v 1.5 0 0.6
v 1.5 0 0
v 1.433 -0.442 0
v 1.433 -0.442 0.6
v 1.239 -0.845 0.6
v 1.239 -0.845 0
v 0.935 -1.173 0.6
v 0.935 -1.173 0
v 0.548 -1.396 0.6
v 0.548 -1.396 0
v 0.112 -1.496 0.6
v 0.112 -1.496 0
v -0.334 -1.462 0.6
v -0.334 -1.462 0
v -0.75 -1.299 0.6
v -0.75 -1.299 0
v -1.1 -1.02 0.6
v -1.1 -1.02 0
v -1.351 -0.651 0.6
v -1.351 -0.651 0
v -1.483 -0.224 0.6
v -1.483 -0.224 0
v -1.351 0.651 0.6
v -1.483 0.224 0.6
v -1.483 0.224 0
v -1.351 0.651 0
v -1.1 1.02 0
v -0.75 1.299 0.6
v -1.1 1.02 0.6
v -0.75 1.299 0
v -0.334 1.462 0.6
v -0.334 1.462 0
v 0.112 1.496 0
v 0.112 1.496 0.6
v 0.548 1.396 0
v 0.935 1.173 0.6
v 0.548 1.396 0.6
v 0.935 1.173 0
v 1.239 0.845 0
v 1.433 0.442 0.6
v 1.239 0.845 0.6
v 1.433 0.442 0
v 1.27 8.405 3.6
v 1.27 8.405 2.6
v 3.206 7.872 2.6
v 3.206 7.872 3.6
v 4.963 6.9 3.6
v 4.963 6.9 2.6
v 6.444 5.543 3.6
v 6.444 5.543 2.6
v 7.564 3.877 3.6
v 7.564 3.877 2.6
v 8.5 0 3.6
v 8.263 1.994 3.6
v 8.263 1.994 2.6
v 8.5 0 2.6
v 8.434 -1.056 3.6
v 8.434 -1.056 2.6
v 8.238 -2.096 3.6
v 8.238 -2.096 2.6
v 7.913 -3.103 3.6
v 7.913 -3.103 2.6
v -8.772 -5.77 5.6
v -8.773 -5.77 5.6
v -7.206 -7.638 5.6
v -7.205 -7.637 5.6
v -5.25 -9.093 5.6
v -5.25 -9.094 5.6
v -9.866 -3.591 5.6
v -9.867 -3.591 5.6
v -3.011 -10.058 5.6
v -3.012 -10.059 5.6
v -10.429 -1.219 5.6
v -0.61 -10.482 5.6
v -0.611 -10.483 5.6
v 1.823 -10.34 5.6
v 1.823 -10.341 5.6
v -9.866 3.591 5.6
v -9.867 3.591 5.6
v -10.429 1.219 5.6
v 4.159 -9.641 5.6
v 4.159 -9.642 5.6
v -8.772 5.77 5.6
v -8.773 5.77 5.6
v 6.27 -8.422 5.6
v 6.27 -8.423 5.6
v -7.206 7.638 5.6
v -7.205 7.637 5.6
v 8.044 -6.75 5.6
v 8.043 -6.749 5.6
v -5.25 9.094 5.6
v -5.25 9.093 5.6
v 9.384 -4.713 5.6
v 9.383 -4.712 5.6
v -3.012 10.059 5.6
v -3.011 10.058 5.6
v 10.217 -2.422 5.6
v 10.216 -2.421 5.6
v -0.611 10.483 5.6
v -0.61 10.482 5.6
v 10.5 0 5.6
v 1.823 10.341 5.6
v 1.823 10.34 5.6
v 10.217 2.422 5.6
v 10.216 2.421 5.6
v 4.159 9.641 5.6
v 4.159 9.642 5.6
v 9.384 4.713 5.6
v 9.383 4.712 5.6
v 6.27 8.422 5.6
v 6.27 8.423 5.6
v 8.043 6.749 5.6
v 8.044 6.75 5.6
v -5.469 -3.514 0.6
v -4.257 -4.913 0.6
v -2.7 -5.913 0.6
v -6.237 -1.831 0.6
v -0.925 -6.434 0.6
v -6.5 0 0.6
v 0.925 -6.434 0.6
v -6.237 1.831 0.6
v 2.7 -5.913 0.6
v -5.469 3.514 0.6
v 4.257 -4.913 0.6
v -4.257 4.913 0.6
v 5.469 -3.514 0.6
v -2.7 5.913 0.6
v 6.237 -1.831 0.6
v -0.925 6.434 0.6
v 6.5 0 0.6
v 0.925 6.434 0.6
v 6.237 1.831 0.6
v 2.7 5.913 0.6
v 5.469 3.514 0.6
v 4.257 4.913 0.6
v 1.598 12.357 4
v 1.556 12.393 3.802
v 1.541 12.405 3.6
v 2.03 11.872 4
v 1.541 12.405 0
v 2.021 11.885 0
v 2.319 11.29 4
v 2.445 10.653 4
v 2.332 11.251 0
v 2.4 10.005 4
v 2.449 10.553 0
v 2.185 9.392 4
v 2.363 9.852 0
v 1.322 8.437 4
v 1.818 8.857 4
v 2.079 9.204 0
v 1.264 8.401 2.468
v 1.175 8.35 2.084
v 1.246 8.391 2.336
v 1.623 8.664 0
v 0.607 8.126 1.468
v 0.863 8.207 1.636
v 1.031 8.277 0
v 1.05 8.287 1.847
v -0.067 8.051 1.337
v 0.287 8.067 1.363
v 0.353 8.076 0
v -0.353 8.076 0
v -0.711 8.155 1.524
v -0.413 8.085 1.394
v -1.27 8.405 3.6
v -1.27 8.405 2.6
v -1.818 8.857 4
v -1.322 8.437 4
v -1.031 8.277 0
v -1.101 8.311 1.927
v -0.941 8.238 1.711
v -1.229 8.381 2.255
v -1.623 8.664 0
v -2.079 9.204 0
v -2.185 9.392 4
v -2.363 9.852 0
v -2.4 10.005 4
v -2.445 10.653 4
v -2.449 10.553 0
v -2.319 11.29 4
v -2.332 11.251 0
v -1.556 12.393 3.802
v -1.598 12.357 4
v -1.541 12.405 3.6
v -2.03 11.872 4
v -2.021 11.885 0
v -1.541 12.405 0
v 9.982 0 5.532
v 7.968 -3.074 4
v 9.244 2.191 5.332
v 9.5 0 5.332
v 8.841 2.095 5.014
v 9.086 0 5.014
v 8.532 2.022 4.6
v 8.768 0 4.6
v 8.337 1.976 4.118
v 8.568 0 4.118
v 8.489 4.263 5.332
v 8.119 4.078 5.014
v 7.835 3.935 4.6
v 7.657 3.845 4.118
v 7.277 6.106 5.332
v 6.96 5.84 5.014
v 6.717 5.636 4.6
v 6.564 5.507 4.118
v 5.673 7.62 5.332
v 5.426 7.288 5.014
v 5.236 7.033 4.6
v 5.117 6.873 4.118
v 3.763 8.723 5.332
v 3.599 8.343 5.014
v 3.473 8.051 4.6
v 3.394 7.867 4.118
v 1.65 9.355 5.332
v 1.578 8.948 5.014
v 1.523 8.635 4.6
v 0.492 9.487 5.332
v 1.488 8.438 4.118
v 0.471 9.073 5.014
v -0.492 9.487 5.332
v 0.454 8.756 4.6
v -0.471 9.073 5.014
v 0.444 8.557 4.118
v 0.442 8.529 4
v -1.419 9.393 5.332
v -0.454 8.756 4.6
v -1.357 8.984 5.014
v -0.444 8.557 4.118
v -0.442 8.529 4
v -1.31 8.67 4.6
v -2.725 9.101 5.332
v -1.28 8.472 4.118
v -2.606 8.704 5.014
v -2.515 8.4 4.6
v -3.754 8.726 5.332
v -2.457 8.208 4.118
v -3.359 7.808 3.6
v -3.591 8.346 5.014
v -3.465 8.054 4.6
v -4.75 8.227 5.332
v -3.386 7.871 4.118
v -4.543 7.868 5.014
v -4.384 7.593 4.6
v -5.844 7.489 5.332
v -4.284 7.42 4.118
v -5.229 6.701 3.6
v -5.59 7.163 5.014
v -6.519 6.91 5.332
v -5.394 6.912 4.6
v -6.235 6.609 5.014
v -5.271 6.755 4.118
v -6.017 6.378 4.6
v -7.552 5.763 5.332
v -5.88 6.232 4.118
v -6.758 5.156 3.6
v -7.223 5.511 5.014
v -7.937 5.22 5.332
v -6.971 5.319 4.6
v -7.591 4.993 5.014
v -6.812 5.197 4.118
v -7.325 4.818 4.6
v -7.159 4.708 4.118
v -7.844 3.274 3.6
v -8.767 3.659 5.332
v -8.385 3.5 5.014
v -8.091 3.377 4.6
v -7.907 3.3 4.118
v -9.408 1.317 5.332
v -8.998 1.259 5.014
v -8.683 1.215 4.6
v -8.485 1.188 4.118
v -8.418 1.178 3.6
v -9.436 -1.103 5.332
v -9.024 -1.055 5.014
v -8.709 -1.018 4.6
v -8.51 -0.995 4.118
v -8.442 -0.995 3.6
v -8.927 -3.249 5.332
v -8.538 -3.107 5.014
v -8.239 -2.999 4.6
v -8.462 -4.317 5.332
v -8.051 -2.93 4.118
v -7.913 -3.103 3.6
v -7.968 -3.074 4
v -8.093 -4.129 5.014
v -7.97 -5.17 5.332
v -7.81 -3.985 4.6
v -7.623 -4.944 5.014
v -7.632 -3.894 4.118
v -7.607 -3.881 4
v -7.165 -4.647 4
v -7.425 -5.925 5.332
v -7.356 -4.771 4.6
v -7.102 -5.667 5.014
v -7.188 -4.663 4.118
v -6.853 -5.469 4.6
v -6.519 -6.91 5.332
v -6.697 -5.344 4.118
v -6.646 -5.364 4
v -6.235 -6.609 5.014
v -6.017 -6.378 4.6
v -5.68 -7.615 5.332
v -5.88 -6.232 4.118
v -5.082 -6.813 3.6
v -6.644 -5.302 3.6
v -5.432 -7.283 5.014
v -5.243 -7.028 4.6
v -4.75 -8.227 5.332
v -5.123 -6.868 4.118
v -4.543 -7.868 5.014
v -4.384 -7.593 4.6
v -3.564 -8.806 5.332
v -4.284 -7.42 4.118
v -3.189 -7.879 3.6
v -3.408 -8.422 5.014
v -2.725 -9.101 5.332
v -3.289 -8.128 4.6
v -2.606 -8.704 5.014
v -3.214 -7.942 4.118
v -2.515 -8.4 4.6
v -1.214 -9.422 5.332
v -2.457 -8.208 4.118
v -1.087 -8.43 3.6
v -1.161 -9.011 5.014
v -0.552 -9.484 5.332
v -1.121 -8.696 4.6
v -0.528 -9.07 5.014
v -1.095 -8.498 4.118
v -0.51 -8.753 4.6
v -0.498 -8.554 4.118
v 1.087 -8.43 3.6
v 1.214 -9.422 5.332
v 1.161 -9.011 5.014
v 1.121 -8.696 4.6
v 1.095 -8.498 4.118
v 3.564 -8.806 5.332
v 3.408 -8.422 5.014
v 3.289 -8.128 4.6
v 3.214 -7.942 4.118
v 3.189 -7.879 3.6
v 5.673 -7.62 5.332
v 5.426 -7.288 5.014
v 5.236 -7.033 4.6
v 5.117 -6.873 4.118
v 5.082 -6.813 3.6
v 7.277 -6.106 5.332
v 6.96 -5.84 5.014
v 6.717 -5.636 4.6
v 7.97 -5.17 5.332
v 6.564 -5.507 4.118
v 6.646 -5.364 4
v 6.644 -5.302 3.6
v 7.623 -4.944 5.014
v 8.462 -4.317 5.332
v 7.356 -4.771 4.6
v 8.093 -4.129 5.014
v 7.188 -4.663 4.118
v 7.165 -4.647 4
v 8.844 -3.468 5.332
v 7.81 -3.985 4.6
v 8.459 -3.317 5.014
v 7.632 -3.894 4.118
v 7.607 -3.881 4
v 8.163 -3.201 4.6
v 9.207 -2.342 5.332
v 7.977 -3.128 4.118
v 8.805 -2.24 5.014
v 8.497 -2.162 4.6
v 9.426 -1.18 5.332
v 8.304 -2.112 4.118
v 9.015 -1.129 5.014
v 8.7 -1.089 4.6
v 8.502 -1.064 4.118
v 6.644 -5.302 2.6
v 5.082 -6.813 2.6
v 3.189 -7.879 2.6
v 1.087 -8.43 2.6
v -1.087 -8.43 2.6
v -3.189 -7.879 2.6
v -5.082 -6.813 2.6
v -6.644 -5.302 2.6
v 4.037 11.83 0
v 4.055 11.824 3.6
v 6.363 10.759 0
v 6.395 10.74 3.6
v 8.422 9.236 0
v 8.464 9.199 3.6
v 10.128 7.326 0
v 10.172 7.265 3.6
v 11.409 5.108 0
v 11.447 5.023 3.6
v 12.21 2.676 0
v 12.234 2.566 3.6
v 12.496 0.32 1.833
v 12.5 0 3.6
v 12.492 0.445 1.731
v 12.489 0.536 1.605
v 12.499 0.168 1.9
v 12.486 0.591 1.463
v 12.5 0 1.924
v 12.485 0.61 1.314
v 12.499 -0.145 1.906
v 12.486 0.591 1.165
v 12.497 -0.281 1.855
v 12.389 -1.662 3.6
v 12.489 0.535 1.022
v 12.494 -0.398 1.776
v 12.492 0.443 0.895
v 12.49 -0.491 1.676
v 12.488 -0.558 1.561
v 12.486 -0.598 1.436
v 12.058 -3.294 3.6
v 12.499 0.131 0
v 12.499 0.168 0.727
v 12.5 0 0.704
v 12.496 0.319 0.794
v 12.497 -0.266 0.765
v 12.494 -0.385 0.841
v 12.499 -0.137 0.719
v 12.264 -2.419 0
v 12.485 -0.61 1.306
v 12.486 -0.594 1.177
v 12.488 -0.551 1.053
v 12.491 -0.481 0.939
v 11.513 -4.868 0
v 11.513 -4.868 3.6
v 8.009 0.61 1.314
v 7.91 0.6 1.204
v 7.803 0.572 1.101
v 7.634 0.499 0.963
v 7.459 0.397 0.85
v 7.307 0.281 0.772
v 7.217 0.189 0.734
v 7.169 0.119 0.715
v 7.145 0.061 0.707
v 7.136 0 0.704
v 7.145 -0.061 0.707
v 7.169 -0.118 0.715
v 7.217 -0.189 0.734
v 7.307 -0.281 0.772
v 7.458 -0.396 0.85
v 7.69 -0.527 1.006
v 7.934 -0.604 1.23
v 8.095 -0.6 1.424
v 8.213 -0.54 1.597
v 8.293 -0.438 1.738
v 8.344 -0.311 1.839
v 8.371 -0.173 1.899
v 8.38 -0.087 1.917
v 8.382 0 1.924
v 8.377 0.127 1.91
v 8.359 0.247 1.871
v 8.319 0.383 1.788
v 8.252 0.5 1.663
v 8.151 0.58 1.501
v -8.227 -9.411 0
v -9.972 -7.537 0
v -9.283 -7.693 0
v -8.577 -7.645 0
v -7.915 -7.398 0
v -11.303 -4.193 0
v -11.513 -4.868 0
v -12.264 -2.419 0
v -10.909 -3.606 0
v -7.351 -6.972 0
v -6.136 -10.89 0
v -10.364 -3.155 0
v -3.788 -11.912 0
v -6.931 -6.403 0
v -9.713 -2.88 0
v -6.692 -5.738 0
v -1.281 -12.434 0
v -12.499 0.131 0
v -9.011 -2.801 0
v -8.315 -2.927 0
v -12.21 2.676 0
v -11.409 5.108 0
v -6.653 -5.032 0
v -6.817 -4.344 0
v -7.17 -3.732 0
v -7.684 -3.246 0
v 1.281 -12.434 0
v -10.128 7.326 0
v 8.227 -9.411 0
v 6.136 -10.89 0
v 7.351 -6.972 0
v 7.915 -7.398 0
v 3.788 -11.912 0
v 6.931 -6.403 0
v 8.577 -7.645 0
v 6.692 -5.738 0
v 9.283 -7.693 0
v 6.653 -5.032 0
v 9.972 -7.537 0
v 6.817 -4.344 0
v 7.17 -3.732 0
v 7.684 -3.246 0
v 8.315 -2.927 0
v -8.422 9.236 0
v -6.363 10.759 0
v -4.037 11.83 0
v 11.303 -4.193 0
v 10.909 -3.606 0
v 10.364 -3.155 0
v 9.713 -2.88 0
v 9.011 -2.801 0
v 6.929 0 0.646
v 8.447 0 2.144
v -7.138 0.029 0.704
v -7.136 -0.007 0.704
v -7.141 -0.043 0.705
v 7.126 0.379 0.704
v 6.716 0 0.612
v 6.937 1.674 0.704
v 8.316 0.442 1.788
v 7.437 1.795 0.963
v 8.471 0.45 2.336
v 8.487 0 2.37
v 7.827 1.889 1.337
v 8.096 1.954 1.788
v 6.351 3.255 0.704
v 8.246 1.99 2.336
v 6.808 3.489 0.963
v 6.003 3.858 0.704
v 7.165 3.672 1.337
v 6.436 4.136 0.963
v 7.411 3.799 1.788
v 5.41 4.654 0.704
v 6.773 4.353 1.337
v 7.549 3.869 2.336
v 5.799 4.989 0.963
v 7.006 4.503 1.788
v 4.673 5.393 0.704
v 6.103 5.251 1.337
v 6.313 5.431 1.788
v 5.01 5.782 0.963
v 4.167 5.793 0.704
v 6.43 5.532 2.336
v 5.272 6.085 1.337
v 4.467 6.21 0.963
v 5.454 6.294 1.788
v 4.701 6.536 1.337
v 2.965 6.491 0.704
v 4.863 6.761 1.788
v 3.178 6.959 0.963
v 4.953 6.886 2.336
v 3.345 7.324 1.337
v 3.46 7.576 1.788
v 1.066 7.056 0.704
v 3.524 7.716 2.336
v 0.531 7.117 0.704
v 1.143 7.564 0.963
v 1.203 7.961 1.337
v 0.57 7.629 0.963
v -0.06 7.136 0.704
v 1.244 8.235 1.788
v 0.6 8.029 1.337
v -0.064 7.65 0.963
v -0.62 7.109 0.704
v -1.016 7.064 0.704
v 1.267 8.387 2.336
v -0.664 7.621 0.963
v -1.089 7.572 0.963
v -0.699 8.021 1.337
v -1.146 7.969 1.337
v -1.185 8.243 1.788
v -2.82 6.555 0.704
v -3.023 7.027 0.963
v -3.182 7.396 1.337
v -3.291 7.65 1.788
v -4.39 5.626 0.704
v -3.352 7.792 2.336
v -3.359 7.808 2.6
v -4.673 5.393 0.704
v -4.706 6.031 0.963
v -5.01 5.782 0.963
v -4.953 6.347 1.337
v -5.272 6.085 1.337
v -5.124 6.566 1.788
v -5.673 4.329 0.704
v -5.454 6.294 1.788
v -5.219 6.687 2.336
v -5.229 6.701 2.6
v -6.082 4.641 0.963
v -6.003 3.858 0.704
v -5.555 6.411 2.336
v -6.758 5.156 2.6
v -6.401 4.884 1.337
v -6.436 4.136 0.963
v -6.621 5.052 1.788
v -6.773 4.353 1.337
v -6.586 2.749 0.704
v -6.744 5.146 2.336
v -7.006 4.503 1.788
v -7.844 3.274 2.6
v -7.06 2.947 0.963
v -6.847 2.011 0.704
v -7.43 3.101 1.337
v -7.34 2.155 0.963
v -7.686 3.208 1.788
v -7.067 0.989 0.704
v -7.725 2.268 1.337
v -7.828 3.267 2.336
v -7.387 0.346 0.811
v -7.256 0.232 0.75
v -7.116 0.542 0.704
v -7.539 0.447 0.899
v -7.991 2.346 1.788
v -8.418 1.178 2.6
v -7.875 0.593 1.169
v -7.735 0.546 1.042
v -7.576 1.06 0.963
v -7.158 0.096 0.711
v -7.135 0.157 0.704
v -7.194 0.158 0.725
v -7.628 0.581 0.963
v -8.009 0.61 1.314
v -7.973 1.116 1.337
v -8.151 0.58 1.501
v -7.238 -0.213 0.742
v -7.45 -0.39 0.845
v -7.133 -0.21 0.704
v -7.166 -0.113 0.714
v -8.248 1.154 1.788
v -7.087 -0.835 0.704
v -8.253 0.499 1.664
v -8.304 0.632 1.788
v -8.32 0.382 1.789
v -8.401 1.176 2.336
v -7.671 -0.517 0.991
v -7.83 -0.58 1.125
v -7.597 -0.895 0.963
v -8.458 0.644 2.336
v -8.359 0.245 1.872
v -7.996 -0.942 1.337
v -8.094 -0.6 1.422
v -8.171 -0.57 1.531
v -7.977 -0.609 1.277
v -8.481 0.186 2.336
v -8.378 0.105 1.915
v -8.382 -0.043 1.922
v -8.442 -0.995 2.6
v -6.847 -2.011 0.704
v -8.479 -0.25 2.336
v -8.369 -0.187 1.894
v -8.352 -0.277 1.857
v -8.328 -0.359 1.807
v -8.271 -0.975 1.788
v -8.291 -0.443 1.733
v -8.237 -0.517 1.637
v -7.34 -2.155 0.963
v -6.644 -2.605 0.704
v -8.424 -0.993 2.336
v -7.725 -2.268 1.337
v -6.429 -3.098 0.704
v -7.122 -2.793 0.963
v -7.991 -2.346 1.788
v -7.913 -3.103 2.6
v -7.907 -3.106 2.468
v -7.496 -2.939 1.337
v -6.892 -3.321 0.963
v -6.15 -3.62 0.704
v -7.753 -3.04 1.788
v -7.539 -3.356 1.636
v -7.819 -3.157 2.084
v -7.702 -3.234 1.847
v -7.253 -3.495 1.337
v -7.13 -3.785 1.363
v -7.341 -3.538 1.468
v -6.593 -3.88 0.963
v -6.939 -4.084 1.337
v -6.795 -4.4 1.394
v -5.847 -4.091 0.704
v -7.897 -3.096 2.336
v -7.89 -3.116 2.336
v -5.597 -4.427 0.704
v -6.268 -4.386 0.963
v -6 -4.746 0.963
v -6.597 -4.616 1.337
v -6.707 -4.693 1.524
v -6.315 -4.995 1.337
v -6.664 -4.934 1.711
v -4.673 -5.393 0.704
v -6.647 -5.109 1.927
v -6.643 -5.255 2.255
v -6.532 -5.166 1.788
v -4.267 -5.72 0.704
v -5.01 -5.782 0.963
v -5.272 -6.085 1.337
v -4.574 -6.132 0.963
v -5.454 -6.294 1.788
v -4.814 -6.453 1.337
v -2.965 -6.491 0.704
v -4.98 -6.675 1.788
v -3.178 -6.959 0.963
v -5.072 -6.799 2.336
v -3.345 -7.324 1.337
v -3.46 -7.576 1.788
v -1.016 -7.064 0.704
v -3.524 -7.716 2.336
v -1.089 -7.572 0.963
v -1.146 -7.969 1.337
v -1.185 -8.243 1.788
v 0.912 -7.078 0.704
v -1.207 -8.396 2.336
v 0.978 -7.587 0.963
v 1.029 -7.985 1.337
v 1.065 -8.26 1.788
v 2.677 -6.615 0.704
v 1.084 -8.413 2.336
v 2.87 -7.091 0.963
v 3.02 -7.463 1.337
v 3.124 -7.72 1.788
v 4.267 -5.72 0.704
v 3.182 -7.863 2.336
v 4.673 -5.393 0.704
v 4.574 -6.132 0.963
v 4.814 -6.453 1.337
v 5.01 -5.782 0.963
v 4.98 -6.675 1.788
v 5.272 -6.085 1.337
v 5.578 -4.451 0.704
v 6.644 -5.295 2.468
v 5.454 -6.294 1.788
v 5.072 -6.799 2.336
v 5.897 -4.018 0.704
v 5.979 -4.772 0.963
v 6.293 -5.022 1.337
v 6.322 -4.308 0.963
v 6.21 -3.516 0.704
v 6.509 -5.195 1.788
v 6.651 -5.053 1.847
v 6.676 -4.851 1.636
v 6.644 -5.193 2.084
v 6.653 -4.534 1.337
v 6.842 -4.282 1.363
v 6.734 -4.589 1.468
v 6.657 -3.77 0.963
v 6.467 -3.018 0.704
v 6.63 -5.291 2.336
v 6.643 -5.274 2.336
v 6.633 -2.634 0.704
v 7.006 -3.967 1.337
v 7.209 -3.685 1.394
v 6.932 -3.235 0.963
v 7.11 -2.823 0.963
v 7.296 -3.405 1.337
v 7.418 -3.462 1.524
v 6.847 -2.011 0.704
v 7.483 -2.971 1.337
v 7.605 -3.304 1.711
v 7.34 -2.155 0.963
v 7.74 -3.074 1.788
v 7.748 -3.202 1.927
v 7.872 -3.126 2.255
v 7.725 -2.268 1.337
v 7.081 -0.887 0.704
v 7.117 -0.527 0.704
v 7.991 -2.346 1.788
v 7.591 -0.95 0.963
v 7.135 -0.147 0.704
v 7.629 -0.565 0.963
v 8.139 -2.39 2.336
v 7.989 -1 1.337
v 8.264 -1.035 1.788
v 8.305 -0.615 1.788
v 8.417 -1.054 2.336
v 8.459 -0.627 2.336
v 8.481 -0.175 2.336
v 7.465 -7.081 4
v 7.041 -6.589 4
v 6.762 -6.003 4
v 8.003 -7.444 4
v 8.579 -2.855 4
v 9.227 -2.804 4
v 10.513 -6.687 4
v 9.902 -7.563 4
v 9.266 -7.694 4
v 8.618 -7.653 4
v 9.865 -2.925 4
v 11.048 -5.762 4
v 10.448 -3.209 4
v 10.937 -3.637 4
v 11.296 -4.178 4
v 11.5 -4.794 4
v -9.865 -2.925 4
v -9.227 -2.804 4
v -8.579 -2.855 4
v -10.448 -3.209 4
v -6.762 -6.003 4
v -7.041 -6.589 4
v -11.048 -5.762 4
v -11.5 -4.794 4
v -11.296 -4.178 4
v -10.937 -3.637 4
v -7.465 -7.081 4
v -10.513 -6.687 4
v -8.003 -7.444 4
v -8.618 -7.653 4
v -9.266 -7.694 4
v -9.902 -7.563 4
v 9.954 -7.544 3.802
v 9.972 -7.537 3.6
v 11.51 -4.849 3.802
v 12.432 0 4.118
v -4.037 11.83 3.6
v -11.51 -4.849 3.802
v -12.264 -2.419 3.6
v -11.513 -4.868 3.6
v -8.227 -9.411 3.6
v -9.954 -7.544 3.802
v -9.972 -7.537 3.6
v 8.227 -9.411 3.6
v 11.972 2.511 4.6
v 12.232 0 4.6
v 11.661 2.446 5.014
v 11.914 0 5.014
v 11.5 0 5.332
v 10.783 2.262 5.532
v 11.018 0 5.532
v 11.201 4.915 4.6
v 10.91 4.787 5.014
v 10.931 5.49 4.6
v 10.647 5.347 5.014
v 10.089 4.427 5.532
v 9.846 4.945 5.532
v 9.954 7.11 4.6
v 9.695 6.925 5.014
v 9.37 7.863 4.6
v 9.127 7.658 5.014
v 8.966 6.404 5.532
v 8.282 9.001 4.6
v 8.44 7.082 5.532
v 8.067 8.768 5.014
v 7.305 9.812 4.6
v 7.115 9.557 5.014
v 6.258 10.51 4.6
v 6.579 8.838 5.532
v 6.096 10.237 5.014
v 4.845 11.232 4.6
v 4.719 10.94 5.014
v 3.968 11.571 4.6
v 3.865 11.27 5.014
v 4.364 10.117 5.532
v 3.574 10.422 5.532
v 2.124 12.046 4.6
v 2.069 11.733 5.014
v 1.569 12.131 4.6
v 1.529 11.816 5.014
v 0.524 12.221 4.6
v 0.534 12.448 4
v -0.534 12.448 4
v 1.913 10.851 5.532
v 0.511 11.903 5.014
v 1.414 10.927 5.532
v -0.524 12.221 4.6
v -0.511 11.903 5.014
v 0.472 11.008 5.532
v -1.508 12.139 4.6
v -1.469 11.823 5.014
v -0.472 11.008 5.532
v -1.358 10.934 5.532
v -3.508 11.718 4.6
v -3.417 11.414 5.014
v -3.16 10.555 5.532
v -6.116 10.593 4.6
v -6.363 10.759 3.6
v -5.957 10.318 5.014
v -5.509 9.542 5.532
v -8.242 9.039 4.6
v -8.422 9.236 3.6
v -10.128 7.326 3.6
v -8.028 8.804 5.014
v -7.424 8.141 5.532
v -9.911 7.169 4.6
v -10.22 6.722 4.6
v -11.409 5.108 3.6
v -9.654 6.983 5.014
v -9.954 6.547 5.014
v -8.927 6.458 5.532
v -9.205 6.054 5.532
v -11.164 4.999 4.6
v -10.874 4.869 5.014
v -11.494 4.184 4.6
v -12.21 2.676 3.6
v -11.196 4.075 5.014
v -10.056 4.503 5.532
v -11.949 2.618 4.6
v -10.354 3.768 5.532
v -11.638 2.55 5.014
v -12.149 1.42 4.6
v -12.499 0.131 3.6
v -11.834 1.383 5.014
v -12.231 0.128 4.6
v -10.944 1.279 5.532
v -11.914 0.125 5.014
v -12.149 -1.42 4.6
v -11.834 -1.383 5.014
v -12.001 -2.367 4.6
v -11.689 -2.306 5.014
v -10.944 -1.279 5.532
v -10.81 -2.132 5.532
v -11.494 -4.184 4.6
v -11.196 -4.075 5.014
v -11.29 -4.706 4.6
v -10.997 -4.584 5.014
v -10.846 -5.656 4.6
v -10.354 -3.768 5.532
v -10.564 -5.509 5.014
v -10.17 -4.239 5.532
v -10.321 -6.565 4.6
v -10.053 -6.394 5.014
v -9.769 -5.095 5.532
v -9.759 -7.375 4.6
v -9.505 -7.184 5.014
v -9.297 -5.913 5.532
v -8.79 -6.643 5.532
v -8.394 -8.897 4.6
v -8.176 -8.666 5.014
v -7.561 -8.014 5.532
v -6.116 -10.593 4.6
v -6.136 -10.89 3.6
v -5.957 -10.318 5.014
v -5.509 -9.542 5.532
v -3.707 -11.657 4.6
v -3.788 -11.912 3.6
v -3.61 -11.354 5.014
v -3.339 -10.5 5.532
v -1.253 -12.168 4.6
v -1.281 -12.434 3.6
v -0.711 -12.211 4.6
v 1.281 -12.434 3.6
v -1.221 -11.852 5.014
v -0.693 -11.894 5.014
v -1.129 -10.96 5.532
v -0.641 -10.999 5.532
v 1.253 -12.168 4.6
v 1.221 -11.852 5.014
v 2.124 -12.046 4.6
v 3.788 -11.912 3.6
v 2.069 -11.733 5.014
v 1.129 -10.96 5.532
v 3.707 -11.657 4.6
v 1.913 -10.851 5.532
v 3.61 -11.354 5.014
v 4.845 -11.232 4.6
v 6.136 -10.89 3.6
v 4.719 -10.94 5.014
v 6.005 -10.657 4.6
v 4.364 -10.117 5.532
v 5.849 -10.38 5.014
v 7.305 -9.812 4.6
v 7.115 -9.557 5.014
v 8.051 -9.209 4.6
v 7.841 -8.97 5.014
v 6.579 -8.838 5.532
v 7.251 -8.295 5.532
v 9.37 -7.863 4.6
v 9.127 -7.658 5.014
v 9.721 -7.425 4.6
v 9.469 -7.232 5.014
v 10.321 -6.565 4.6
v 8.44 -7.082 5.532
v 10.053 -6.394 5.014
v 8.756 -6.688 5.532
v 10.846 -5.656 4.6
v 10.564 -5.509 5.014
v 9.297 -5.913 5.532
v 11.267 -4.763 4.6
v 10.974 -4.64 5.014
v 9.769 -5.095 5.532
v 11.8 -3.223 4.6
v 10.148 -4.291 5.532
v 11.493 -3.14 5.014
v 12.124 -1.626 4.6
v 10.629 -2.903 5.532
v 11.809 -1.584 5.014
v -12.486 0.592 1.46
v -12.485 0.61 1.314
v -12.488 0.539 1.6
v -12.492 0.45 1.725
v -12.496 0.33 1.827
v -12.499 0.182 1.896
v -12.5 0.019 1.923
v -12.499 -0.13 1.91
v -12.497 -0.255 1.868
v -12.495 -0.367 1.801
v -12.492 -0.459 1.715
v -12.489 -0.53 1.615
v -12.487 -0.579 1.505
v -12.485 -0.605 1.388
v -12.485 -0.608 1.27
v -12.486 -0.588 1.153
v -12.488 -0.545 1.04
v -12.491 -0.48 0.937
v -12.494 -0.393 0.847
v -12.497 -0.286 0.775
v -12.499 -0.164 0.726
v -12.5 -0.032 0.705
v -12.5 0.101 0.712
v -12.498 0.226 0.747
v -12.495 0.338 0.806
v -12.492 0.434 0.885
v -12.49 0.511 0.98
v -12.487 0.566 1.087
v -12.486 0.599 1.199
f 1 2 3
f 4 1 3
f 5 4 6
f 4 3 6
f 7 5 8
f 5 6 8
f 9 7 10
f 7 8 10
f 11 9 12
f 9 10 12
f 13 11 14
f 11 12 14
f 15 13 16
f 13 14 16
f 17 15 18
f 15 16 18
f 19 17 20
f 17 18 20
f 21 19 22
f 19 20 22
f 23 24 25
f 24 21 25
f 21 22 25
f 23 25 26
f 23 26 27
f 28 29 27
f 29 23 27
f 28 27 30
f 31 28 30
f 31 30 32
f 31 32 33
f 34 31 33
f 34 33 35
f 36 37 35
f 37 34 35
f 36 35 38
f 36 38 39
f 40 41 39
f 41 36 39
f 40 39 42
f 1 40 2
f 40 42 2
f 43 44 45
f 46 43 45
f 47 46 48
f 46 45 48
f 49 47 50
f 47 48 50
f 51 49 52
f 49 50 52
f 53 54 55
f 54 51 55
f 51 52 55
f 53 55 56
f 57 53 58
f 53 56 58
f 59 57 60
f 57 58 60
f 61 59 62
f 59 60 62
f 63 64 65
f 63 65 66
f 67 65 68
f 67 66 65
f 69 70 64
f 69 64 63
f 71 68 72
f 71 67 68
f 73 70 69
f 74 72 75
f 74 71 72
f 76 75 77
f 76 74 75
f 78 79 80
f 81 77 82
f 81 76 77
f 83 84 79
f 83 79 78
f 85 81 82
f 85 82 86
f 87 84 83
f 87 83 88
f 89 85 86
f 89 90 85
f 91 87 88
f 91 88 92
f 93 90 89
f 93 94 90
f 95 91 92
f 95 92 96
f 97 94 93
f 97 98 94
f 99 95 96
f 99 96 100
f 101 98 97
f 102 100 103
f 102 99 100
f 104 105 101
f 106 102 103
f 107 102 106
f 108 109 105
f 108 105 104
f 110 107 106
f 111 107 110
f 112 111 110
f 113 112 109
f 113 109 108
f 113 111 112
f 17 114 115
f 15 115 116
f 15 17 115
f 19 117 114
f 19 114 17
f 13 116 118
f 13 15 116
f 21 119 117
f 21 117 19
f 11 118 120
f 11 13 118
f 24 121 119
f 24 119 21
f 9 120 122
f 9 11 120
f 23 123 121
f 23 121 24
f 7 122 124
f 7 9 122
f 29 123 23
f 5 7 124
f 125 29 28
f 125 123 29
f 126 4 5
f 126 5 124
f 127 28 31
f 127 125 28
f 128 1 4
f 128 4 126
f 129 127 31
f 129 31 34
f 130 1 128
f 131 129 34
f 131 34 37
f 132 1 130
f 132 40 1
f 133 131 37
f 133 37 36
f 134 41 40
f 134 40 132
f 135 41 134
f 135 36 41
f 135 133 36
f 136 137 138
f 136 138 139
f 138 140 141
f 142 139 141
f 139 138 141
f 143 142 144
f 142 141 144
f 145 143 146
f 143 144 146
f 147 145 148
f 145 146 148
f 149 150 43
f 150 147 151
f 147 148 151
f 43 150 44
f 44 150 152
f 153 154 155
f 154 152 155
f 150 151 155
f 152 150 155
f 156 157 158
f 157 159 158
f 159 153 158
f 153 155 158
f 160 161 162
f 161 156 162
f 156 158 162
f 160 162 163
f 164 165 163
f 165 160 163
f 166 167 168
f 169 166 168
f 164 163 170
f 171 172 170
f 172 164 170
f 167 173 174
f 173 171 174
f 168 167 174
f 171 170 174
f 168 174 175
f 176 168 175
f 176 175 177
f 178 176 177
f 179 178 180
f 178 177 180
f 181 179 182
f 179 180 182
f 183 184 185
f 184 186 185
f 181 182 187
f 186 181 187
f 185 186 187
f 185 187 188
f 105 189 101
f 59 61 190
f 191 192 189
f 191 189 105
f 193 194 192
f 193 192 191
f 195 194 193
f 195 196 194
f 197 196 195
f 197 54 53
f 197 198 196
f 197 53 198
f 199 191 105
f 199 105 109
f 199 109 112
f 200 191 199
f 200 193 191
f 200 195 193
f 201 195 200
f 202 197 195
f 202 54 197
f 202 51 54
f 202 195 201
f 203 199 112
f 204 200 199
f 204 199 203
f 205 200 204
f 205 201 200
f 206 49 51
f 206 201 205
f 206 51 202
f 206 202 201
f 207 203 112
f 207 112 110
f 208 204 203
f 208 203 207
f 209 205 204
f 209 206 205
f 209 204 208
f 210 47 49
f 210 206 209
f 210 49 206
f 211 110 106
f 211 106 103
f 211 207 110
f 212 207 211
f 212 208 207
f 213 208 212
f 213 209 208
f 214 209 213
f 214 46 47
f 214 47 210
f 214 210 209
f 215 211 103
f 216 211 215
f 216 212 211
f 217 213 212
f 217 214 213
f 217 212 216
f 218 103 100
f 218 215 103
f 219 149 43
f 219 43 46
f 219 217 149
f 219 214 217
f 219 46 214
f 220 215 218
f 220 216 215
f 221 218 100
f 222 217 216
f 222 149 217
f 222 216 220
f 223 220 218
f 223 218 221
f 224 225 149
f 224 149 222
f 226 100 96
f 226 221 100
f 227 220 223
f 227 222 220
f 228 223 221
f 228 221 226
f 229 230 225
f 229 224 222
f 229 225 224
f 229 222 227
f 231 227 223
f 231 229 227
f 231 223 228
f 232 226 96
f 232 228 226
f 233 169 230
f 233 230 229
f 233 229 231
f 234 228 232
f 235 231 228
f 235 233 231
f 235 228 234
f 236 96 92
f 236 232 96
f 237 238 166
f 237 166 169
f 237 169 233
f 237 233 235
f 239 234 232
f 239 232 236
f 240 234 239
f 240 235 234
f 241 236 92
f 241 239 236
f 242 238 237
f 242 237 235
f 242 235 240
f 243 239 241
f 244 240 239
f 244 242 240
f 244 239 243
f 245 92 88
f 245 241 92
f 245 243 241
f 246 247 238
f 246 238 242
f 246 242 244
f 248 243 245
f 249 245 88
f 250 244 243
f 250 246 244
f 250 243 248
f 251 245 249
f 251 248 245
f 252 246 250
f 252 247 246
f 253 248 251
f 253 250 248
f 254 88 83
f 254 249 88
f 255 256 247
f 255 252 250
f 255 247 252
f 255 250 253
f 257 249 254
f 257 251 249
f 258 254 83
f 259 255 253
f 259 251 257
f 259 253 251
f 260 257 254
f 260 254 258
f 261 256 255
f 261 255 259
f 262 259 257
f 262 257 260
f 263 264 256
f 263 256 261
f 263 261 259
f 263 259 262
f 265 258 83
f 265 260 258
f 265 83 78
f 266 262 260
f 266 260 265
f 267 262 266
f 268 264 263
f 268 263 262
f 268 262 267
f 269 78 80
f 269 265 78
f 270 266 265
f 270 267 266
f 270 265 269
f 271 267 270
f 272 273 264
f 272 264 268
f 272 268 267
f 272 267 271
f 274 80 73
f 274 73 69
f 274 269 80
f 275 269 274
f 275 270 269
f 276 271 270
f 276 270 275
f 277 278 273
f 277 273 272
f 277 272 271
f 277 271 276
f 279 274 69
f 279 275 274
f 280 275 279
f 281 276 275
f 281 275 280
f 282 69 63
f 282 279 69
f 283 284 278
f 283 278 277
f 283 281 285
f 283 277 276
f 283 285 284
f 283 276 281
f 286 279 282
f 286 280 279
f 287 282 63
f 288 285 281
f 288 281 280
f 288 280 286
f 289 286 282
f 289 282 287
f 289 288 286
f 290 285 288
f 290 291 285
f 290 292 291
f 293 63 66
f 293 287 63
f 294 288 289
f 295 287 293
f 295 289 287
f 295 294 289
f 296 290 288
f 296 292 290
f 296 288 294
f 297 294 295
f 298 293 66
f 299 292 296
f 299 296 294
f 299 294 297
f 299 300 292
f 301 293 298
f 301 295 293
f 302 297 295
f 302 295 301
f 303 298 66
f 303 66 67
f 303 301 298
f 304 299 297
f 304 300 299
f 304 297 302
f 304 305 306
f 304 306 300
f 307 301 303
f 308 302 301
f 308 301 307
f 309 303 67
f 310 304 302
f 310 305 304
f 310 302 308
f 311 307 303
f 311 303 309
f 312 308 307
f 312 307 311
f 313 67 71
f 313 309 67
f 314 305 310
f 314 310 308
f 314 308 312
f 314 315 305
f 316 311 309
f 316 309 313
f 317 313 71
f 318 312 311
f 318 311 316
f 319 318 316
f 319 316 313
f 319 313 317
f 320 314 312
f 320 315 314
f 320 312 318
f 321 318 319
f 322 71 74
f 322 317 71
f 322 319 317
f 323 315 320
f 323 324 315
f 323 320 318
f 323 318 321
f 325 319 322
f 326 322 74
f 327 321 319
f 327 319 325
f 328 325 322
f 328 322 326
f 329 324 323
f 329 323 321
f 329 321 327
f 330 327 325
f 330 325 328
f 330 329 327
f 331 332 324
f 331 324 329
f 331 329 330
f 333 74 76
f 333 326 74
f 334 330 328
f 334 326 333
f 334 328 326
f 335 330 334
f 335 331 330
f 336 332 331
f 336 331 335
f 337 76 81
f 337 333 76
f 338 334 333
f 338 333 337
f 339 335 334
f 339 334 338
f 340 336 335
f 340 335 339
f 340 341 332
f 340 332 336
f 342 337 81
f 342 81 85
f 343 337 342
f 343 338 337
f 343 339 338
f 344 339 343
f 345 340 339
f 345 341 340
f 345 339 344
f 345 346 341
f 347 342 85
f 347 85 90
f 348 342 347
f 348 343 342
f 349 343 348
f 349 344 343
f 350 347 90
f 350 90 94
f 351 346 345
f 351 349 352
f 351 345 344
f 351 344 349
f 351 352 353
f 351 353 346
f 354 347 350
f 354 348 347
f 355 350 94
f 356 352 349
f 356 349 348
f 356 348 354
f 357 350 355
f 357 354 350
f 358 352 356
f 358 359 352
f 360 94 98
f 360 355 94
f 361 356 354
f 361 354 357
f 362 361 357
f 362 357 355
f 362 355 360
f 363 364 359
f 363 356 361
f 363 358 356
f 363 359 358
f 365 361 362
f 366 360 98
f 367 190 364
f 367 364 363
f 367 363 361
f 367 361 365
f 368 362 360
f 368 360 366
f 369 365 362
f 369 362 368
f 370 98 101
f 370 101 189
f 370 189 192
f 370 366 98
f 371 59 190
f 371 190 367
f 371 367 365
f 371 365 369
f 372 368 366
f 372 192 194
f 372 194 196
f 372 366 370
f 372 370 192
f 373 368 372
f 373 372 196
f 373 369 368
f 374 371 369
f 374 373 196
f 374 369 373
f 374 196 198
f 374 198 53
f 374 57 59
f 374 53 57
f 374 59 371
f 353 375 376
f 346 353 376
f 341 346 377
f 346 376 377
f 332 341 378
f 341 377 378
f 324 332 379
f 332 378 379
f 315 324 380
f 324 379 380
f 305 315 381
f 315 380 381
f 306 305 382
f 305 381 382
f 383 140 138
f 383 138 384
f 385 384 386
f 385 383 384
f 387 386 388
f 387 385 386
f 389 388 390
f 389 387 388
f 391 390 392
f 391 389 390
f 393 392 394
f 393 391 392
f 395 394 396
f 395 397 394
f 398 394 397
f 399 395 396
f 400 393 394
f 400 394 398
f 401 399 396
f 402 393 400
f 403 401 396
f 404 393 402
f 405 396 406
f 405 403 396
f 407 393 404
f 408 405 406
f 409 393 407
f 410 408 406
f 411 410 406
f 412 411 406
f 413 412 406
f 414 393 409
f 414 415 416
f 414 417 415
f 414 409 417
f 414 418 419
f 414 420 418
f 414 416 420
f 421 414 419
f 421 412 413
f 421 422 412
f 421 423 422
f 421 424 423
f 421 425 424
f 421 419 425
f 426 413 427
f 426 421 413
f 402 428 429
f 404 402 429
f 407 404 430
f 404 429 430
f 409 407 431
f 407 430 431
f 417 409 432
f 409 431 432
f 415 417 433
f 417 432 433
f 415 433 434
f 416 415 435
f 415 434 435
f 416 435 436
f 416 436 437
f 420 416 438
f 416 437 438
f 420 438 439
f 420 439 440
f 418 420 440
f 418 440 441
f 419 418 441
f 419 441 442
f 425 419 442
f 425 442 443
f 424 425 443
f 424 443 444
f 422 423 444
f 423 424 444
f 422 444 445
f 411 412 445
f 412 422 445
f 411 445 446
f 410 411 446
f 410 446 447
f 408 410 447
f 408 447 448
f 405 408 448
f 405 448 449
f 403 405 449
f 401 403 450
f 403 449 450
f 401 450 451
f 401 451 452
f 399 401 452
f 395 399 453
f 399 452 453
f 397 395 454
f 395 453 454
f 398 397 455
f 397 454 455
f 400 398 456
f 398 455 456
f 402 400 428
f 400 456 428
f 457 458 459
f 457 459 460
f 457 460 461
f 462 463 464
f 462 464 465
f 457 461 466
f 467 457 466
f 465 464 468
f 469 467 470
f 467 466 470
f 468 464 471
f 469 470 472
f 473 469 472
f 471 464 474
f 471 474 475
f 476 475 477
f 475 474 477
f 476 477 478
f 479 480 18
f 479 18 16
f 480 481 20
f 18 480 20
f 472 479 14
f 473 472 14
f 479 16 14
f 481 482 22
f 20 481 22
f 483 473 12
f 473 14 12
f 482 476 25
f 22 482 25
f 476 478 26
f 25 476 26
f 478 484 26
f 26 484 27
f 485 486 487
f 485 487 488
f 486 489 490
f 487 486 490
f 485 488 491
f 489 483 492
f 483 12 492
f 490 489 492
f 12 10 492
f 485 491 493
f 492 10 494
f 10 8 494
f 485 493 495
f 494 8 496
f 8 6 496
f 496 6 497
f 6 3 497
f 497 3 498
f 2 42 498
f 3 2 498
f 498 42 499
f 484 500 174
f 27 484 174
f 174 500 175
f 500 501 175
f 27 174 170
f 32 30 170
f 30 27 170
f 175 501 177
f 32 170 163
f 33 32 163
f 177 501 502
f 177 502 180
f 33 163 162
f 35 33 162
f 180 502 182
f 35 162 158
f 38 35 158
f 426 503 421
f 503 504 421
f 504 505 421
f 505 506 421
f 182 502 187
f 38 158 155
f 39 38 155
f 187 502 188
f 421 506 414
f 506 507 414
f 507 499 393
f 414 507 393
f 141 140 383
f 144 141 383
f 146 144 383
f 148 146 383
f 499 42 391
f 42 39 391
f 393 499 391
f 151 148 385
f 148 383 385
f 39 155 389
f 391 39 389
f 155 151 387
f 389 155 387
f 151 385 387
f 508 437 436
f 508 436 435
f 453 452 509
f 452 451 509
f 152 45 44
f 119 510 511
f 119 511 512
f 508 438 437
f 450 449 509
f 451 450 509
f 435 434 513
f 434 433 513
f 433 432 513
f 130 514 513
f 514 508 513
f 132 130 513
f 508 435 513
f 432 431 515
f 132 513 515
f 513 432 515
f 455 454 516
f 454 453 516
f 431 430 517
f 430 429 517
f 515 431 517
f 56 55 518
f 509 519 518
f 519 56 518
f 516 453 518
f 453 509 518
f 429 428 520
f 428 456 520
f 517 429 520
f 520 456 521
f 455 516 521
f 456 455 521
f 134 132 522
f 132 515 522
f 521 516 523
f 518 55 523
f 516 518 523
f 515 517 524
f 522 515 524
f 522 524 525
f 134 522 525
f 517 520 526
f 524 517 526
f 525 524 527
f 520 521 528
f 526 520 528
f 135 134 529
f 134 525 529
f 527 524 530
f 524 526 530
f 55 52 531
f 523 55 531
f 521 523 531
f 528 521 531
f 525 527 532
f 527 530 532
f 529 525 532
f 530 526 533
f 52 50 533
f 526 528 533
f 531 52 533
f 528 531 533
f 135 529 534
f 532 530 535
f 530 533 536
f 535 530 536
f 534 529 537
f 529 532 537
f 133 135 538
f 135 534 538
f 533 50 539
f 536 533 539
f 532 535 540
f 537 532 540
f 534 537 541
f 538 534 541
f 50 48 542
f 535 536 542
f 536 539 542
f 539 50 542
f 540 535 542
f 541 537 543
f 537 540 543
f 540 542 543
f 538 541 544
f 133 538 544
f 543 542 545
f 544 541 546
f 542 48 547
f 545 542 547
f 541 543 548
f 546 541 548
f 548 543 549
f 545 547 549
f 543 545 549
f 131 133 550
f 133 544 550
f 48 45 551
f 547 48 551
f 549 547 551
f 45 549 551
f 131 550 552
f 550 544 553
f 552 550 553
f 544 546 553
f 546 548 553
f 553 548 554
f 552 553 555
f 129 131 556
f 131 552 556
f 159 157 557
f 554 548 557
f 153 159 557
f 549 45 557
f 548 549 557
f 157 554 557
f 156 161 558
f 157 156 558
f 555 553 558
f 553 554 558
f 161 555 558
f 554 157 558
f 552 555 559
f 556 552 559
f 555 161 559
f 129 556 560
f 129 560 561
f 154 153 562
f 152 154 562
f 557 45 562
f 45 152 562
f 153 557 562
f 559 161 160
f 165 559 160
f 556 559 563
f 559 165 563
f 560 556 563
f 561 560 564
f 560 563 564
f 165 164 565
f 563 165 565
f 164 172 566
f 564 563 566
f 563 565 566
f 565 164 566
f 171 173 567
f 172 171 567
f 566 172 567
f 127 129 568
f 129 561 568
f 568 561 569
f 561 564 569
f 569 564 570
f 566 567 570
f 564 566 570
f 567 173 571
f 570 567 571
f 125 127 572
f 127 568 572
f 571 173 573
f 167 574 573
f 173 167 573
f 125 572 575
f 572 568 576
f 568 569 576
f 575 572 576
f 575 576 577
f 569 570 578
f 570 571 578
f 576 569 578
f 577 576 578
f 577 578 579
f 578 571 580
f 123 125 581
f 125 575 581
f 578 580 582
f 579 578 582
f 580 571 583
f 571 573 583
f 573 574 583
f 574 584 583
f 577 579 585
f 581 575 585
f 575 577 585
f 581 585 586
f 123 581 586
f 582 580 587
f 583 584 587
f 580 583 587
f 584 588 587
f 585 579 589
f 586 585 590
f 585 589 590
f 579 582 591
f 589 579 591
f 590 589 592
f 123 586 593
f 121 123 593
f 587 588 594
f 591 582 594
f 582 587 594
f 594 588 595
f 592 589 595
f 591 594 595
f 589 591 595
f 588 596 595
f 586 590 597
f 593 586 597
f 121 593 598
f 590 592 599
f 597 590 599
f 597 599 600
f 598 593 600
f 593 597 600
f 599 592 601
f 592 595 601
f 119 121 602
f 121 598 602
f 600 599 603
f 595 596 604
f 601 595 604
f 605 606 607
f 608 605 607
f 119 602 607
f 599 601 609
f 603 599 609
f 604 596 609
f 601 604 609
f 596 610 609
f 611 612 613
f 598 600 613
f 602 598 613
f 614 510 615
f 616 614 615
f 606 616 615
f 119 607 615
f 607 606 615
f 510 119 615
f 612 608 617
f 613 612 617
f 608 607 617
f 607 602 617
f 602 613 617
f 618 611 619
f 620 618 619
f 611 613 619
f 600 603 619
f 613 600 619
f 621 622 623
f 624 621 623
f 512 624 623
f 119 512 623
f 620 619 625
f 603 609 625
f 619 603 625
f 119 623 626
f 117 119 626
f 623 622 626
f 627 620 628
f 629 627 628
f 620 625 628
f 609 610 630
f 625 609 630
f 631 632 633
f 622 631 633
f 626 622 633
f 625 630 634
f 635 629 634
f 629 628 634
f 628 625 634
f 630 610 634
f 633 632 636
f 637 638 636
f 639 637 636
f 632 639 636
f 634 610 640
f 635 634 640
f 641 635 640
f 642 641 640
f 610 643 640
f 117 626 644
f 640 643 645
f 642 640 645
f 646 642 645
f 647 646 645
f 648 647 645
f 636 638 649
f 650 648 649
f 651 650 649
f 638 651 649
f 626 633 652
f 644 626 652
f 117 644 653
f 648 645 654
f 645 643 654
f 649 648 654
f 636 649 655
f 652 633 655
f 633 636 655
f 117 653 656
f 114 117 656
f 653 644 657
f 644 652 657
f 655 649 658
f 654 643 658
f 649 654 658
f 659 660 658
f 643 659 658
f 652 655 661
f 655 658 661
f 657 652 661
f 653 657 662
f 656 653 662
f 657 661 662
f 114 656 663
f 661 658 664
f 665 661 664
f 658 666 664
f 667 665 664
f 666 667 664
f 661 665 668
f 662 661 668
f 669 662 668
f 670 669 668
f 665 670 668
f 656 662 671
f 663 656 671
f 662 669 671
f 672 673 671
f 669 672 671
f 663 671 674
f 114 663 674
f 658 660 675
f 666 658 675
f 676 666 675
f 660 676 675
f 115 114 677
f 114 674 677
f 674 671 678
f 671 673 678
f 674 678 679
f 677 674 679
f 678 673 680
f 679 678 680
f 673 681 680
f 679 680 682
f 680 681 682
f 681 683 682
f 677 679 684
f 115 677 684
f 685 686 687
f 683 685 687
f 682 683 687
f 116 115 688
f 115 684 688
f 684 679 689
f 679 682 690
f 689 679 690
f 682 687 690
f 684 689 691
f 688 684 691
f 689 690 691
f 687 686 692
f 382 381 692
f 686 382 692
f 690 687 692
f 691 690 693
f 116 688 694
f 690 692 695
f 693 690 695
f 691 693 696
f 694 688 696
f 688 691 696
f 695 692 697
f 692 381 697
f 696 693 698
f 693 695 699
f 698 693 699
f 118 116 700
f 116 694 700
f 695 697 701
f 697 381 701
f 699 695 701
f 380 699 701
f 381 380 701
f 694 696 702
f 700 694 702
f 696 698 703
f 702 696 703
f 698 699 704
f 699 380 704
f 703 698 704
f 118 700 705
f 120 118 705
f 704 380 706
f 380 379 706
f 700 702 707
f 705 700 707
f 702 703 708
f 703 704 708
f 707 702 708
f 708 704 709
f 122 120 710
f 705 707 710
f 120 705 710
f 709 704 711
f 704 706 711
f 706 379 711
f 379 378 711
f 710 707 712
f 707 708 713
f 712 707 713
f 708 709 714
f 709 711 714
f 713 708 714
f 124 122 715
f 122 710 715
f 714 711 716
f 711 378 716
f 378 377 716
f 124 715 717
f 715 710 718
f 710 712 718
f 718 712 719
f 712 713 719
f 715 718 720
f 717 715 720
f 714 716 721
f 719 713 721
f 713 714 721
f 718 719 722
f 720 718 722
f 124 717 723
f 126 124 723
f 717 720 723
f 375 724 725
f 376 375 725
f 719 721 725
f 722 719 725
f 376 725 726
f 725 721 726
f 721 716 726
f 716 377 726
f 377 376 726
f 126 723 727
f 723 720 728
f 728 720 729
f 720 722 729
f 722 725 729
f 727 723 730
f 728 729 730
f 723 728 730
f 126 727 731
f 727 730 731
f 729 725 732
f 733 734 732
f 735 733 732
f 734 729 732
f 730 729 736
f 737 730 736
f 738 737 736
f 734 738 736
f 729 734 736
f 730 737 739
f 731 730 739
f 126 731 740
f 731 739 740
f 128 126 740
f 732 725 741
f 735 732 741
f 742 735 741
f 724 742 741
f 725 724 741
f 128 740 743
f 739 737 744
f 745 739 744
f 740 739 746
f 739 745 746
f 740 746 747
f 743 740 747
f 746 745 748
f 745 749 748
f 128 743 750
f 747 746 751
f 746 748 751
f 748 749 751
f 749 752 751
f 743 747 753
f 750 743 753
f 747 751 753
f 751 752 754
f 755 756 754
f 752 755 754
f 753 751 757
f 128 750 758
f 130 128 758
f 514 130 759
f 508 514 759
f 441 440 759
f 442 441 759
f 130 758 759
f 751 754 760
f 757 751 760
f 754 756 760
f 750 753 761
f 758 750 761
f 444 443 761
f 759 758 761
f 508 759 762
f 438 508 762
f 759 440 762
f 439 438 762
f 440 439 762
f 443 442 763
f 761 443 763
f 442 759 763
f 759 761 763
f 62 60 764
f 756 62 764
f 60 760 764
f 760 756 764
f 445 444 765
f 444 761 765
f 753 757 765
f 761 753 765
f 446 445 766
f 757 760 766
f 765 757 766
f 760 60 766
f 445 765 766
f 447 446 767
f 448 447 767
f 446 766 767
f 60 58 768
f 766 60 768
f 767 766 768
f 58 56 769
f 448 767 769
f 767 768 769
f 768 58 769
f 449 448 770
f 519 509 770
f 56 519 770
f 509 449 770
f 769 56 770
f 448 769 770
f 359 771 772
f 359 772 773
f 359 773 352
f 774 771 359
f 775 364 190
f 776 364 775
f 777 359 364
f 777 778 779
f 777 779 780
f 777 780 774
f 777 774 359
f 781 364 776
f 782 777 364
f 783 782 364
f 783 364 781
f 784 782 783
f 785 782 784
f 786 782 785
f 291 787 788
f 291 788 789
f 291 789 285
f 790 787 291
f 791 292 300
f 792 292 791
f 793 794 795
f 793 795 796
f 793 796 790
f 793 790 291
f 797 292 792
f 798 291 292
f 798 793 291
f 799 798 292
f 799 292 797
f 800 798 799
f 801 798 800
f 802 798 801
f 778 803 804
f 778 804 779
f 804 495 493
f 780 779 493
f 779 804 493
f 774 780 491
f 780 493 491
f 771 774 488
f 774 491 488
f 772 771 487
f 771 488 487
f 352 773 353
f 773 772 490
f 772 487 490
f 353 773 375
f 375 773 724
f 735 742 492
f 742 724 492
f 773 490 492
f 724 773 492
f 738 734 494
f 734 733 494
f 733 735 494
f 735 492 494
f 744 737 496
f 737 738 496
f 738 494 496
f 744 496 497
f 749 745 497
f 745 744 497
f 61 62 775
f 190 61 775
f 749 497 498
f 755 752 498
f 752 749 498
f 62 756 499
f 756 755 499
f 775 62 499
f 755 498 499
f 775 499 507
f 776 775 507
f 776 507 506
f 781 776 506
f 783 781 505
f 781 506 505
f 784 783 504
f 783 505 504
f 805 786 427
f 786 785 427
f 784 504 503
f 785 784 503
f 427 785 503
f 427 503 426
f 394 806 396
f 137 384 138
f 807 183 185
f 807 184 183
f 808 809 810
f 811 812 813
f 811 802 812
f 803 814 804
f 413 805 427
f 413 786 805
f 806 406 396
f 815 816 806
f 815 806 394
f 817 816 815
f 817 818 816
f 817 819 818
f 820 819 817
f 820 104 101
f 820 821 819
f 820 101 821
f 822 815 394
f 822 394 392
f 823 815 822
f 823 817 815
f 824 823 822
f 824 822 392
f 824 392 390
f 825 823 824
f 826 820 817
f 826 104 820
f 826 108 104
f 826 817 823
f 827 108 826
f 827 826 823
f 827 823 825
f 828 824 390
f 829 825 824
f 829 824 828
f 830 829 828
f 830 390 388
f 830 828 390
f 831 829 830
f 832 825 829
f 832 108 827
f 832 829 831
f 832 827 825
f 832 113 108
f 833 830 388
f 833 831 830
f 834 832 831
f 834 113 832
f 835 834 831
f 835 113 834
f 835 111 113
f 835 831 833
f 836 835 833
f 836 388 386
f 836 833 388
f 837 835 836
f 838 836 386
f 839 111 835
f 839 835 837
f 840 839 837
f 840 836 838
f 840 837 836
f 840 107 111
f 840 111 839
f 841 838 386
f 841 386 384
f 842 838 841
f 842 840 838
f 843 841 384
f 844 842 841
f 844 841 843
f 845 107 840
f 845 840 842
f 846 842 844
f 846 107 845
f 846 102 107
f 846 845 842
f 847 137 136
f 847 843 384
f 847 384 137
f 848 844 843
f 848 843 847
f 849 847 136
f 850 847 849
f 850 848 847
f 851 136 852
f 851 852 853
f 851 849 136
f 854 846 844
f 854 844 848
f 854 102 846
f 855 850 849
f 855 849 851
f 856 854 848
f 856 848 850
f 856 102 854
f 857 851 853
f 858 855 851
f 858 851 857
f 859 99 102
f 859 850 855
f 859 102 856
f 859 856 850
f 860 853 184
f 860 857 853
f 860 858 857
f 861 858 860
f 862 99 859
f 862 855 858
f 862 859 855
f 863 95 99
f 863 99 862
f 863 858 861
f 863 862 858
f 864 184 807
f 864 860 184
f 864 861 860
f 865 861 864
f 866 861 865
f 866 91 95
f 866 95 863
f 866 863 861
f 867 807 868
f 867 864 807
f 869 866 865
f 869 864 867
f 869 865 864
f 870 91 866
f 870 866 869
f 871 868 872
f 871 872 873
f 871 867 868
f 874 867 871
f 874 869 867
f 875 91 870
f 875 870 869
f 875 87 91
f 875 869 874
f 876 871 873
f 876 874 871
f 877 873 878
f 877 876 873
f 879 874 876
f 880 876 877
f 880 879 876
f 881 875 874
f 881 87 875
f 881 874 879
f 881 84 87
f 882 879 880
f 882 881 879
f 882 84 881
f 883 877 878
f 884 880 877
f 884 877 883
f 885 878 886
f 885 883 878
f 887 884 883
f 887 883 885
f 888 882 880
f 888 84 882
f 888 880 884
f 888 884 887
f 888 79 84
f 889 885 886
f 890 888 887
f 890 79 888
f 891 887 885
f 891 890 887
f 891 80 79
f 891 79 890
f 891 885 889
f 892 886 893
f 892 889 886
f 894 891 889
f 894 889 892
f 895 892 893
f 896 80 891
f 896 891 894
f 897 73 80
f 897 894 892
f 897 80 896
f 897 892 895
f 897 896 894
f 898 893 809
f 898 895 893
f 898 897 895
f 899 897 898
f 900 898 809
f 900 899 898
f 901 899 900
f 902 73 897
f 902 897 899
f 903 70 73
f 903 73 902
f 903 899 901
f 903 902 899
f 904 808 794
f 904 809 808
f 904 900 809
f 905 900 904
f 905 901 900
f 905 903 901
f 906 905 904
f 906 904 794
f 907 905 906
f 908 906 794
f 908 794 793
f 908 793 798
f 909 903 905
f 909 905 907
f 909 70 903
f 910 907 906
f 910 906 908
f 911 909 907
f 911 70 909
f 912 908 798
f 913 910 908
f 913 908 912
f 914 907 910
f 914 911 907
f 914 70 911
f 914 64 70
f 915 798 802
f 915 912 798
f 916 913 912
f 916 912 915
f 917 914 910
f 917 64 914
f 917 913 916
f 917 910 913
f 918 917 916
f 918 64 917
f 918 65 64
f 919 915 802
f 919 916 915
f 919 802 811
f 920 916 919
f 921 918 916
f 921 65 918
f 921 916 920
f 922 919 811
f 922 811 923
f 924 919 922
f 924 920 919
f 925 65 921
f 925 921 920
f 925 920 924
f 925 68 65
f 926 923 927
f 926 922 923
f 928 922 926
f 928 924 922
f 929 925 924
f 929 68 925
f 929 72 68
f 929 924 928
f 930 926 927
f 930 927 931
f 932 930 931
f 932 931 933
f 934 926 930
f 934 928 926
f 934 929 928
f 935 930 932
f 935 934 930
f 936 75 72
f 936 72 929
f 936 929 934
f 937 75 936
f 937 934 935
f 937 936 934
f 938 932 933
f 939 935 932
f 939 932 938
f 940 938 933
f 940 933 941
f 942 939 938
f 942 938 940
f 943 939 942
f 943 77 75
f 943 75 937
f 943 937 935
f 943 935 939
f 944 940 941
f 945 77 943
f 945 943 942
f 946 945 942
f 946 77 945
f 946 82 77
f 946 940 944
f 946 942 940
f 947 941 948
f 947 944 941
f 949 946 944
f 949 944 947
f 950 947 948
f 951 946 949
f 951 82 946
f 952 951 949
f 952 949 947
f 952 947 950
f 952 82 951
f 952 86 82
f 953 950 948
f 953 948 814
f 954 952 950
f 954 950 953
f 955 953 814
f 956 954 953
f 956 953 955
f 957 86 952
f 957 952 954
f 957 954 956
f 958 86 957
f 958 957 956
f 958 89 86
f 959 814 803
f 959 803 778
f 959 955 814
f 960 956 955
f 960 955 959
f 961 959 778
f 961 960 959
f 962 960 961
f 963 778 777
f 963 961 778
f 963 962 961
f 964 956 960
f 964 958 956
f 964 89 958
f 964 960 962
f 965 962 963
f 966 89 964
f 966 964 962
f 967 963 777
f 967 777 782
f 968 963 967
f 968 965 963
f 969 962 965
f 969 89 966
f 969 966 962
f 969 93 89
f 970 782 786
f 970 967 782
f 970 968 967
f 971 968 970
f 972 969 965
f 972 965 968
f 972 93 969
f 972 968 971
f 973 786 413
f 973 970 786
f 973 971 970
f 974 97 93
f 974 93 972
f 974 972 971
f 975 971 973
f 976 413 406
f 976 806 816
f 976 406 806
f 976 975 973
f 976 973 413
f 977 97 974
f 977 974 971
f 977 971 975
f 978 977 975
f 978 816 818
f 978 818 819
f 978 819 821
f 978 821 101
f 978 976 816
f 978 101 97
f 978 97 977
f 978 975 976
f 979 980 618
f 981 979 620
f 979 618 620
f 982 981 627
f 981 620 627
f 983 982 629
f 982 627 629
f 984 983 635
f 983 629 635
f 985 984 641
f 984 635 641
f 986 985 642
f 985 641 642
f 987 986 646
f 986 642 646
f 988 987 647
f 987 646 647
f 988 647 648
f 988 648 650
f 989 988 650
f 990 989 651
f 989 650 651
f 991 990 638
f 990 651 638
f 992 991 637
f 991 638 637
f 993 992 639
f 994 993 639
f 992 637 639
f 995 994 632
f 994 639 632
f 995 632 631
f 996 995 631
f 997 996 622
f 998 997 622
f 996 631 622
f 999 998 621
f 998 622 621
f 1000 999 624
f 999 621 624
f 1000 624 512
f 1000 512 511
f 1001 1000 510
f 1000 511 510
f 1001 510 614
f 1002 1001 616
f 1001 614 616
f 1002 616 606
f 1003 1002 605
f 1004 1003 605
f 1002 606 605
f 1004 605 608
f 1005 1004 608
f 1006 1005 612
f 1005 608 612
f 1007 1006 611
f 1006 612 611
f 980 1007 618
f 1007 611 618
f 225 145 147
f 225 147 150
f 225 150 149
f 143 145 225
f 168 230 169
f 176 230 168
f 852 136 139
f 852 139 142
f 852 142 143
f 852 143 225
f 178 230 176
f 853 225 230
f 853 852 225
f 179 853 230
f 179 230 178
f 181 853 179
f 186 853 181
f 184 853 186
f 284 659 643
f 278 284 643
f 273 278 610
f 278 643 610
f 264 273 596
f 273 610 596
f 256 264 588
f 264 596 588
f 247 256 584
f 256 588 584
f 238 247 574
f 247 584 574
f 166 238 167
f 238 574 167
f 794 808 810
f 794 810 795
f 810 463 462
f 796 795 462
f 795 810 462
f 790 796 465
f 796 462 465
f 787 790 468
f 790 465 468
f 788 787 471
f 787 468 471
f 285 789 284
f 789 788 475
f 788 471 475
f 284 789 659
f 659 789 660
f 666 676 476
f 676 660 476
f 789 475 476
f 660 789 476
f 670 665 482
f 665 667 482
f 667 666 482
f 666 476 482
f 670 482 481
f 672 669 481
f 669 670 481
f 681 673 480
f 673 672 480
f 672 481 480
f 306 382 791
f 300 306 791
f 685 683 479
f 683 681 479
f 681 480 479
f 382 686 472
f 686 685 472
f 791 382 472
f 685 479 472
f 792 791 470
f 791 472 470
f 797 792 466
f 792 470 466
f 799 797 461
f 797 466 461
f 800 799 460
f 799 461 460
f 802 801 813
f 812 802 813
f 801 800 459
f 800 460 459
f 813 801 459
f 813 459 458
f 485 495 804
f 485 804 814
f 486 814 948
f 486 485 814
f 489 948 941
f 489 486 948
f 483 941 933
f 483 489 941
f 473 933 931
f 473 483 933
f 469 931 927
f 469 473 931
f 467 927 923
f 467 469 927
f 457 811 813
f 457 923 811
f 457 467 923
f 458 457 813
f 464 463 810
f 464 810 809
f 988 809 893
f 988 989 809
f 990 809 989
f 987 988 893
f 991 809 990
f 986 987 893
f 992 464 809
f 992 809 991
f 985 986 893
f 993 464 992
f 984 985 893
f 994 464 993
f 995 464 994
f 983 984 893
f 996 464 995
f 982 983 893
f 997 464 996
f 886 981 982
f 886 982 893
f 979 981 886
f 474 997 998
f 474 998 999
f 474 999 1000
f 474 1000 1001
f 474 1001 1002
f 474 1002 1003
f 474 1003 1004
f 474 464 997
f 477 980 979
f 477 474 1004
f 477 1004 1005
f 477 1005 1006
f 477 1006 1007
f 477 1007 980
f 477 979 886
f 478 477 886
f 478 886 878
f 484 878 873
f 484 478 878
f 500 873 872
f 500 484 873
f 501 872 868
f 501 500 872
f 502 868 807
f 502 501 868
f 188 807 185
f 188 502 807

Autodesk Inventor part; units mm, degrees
ref_plane "YZ Plane" through (0, 0, 0) normal (1, 0, 0) x (0, 1, 0)
ref_plane "XZ Plane" through (0, 0, 0) normal (0, 1, 0) x (-1, 0, 0)
ref_plane "XY Plane" through (0, 0, 0) normal (0, 0, 1) x (1, 0, 0)
sketch "Sketch1" plane through (0, 0, 0) normal (0, 0, 1) x (1, 0, 0)
  circle A0 centre (0, 0) radius 12.5
  circle A1 centre (0, 0) radius 1.5
  dimension "d34" = 25
  dimension "d35" = 3
extrude "Extrusion1" add sketch "Sketch1" along normal blind 0.6
sketch "Sketch2" plane through (0, 0, 0.6) normal (0, 0, 1) x (1, 0, 0)
  circle A0 centre (0, 0) radius 12.5 projected
  circle A1 centre (0, 0) radius 8.5
  dimension "d8" = 4
extrude "Extrusion2" add sketch "Sketch2" along normal blind 5
fillet "Fillet1" radius 2 3 edges at (-8.5, 0, 0.6) (-8.5, 0, 5.6) (-12.5, 0, 5.6)
sketch "Sketch3" plane through (0, 0, 0) normal (0, 0, -1) x (-1, 0, 0)
  circle A0 centre (0, 0) radius 12.5 projected
  circle A1 centre (0, -0.75) radius 0.25 projected
  line L0 (-0.2487, -0.7372) -> (-0.25, -0.75)
  line L1 (0, -0.5128) -> (0, -1.0128) construction
  arc A2 (0, -0.5128) -> (-0.2487, -0.7372) centre (0, -0.7628) ccw
  arc A3 (-0.2447, -0.699) -> (0.2447, -0.699) centre (0, -0.75) ccw
  line L2 (0.2487, -0.7372) -> (0.25, -0.75)
  arc A4 (0.2487, -0.7372) -> (0, -0.5128) centre (0, -0.7628) ccw
  point P0 (0, -0.5)
  dimension "d17" = 0.25
sketch "Sketch4" plane through (0, 0, 0) normal (0, 0, -1) x (-1, 0, 0)
  circle A0 centre (0, 0) radius 12.5 projected
  circle A1 centre (0, 10.5) radius 2.45
  dimension "d18" = 4.9
  dimension "d19" = 10.5
extrude "Extrusion4" cut sketch "Sketch4" against normal blind 4 contours A1 A0 | A0 A1 picked at (-0.073, 11.0129) picked at (0, 12.6429)
pattern_circular "Circular Pattern2" count 3 over 360 about axis through (0, 0, 0) along (0, 0, 1) of "Extrusion4"
sketch "Sketch8" plane through (0, 0, 0) normal (1, 0, 0) x (0, 1, 0)
  line L0 (12.4046, 3.6) -> (-4.8677, 3.6) projected
  line L1 (-4.8677, 0) -> (12.4046, 0) projected
  circle A0 centre (0, 1.3137) radius 0.6099
  line L2 (-4.8677, 0) -> (-4.8677, 3.6) projected
  line L3 (12.4046, 3.6) -> (12.4046, 0) projected
  point P0 (0, 0)
  point P1 (-12.5, 0)
  point P2 (-12.5, 3.6)
  point P3 (12.5, 3.6)
  point P4 (12.5, 0)
extrude "Extrusion6" cut sketch "Sketch8" along normal through all both and the other way through all contours A0
properties part number "30_Cube_openSIM_Fouriermask_2"
